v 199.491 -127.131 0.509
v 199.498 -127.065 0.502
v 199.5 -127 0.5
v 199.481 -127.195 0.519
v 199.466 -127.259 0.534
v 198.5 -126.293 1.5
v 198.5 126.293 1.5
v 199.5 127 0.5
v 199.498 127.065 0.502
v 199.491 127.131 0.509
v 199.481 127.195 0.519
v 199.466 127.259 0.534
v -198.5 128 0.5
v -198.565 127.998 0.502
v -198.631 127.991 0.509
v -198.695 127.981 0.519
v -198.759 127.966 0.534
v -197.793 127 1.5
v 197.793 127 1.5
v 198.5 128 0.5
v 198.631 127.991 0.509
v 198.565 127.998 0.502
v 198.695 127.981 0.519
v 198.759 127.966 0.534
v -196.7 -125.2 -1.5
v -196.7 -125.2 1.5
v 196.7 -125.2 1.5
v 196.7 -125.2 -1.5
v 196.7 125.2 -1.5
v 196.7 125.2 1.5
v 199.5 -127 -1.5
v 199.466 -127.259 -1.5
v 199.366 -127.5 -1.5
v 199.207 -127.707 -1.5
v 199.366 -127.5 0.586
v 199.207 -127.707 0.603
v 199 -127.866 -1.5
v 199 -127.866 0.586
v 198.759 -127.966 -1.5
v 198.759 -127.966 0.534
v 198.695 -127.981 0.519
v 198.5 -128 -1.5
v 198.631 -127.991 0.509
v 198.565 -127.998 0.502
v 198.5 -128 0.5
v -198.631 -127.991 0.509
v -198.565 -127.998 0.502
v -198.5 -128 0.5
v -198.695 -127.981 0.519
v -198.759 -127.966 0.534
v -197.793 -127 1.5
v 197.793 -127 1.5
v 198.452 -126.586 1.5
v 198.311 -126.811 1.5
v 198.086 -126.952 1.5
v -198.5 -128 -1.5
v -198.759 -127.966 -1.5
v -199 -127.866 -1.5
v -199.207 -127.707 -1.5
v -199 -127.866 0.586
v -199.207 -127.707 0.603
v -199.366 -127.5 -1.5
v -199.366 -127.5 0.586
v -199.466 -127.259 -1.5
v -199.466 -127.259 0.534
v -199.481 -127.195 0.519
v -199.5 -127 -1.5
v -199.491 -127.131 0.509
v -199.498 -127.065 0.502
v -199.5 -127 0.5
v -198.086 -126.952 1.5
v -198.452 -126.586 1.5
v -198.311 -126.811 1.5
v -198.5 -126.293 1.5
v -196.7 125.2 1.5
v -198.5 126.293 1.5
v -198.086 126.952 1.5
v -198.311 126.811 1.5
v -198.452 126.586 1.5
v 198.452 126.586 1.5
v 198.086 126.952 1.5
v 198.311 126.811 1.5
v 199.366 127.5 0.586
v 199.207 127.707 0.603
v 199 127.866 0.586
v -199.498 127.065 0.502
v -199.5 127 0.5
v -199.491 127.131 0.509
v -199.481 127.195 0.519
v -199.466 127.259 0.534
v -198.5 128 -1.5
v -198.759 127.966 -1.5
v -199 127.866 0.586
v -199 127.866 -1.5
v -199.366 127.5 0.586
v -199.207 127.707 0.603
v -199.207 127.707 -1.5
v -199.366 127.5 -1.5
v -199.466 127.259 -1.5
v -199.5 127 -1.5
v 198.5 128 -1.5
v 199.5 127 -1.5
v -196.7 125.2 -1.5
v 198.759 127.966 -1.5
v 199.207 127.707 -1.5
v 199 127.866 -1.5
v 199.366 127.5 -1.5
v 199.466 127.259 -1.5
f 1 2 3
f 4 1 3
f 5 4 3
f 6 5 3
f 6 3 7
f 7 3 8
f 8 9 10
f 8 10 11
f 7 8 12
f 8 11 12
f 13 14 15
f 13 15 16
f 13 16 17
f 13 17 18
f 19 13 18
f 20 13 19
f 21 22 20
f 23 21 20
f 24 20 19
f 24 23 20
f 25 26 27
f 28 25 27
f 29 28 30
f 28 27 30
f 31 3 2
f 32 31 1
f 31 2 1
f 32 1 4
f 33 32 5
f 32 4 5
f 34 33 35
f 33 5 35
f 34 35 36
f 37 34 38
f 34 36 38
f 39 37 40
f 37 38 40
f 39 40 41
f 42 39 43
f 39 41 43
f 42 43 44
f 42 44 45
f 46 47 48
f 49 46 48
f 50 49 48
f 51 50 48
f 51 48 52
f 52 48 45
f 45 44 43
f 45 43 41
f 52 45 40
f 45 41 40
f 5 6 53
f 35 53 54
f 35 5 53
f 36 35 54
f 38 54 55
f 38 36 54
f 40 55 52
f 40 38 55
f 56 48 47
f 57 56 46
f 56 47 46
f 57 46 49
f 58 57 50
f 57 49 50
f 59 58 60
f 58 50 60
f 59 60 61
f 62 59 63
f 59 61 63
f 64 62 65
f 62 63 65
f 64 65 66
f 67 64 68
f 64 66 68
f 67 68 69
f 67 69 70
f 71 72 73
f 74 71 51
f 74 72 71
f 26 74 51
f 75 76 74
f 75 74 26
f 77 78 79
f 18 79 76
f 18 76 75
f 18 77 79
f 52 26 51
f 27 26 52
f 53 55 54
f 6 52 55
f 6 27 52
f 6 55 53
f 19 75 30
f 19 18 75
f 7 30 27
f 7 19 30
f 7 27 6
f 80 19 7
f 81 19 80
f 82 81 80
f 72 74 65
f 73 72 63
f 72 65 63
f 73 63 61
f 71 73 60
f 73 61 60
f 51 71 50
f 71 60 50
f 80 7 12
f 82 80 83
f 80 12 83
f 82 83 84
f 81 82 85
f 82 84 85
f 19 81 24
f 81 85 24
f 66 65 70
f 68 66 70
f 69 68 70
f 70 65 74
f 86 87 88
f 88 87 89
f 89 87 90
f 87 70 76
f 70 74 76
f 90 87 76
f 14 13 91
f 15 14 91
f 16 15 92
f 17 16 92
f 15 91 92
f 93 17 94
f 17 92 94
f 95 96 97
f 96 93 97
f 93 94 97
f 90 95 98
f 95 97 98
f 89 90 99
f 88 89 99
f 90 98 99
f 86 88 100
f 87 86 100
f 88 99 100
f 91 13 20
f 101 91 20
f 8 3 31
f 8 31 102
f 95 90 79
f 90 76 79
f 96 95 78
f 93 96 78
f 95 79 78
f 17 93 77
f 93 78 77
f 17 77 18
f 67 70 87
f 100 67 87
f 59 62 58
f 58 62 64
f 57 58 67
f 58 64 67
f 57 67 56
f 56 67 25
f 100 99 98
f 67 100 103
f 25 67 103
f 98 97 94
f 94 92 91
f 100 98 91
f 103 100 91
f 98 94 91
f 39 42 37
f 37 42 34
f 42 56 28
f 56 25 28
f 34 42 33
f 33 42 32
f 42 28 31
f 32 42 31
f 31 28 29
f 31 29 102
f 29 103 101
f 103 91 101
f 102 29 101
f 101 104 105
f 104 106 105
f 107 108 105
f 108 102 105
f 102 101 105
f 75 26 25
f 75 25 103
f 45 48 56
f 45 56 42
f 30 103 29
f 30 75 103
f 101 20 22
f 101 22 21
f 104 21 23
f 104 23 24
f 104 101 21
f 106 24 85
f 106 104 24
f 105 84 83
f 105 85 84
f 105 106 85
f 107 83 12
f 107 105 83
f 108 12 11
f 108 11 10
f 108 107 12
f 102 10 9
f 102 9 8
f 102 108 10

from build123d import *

# Parameters (mm, degrees)
F0_W     = 399
F0_H     = 256
F0_W_2   = 393.4
F0_H_2   = 250.4
F1_DEPTH = 1.5
F2_SIZE  = 1
F3_F1_R  = 1
F3_F2_R  = 1
F3_F3_R  = 1
F3_F4_R  = 1
F3_F5_R  = 1
F3_F6_R  = 1
F3_F7_R  = 1
F3_F8_R  = 1


with BuildPart() as f1:
    # F0 (on Top) → F1 (new body, symmetric)
    with BuildSketch(Plane.XY):
        Rectangle(F0_W, F0_H)
        Rectangle(F0_W_2, F0_H_2, mode=Mode.SUBTRACT)
    extrude(amount=F1_DEPTH, both=True)

    # F2
    f2_edges = [f1.edges().sort_by_distance(p)[0] for p in [
        (0, -128, 1.5),
        (-199.5, 0, 1.5),
        (0, 128, 1.5),
        (199.5, 0, 1.5),
    ]]
    chamfer(f2_edges, length=F2_SIZE)

    # F3: fillet of radius 1 on 8 edges, made by hand

    # F3_f1
    f3_f1_edges = [f1.edges().sort_by_distance(p)[0] for p in [
        (199.5, 128, -0.5),
    ]]
    fillet(f3_f1_edges, radius=F3_F1_R)

    # F3_f2
    f3_f2_edges = [f1.edges().sort_by_distance(p)[0] for p in [
        (199.5, -128, -0.5),
    ]]
    fillet(f3_f2_edges, radius=F3_F2_R)

    # F3_f3
    f3_f3_edges = [f1.edges().sort_by_distance(p)[0] for p in [
        (-199.5, 128, -0.5),
    ]]
    fillet(f3_f3_edges, radius=F3_F3_R)

    # F3_f4
    f3_f4_edges = [f1.edges().sort_by_distance(p)[0] for p in [
        (198.8535533906, -127.3535533906, 1.1464466094),
    ]]
    fillet(f3_f4_edges, radius=F3_F4_R)

    # F3_f5
    f3_f5_edges = [f1.edges().sort_by_distance(p)[0] for p in [
        (198.8535533906, 127.3535533906, 1.1464466094),
    ]]
    fillet(f3_f5_edges, radius=F3_F5_R)

    # F3_f6
    f3_f6_edges = [f1.edges().sort_by_distance(p)[0] for p in [
        (-199.5, -128, -0.5),
    ]]
    fillet(f3_f6_edges, radius=F3_F6_R)

    # F3_f7
    f3_f7_edges = [f1.edges().sort_by_distance(p)[0] for p in [
        (-198.8535533906, 127.3535533906, 1.1464466094),
    ]]
    fillet(f3_f7_edges, radius=F3_F7_R)

    # F3_f8
    f3_f8_edges = [f1.edges().sort_by_distance(p)[0] for p in [
        (-198.8535533906, -127.3535533906, 1.1464466094),
    ]]
    fillet(f3_f8_edges, radius=F3_F8_R)


solid = f1.part
